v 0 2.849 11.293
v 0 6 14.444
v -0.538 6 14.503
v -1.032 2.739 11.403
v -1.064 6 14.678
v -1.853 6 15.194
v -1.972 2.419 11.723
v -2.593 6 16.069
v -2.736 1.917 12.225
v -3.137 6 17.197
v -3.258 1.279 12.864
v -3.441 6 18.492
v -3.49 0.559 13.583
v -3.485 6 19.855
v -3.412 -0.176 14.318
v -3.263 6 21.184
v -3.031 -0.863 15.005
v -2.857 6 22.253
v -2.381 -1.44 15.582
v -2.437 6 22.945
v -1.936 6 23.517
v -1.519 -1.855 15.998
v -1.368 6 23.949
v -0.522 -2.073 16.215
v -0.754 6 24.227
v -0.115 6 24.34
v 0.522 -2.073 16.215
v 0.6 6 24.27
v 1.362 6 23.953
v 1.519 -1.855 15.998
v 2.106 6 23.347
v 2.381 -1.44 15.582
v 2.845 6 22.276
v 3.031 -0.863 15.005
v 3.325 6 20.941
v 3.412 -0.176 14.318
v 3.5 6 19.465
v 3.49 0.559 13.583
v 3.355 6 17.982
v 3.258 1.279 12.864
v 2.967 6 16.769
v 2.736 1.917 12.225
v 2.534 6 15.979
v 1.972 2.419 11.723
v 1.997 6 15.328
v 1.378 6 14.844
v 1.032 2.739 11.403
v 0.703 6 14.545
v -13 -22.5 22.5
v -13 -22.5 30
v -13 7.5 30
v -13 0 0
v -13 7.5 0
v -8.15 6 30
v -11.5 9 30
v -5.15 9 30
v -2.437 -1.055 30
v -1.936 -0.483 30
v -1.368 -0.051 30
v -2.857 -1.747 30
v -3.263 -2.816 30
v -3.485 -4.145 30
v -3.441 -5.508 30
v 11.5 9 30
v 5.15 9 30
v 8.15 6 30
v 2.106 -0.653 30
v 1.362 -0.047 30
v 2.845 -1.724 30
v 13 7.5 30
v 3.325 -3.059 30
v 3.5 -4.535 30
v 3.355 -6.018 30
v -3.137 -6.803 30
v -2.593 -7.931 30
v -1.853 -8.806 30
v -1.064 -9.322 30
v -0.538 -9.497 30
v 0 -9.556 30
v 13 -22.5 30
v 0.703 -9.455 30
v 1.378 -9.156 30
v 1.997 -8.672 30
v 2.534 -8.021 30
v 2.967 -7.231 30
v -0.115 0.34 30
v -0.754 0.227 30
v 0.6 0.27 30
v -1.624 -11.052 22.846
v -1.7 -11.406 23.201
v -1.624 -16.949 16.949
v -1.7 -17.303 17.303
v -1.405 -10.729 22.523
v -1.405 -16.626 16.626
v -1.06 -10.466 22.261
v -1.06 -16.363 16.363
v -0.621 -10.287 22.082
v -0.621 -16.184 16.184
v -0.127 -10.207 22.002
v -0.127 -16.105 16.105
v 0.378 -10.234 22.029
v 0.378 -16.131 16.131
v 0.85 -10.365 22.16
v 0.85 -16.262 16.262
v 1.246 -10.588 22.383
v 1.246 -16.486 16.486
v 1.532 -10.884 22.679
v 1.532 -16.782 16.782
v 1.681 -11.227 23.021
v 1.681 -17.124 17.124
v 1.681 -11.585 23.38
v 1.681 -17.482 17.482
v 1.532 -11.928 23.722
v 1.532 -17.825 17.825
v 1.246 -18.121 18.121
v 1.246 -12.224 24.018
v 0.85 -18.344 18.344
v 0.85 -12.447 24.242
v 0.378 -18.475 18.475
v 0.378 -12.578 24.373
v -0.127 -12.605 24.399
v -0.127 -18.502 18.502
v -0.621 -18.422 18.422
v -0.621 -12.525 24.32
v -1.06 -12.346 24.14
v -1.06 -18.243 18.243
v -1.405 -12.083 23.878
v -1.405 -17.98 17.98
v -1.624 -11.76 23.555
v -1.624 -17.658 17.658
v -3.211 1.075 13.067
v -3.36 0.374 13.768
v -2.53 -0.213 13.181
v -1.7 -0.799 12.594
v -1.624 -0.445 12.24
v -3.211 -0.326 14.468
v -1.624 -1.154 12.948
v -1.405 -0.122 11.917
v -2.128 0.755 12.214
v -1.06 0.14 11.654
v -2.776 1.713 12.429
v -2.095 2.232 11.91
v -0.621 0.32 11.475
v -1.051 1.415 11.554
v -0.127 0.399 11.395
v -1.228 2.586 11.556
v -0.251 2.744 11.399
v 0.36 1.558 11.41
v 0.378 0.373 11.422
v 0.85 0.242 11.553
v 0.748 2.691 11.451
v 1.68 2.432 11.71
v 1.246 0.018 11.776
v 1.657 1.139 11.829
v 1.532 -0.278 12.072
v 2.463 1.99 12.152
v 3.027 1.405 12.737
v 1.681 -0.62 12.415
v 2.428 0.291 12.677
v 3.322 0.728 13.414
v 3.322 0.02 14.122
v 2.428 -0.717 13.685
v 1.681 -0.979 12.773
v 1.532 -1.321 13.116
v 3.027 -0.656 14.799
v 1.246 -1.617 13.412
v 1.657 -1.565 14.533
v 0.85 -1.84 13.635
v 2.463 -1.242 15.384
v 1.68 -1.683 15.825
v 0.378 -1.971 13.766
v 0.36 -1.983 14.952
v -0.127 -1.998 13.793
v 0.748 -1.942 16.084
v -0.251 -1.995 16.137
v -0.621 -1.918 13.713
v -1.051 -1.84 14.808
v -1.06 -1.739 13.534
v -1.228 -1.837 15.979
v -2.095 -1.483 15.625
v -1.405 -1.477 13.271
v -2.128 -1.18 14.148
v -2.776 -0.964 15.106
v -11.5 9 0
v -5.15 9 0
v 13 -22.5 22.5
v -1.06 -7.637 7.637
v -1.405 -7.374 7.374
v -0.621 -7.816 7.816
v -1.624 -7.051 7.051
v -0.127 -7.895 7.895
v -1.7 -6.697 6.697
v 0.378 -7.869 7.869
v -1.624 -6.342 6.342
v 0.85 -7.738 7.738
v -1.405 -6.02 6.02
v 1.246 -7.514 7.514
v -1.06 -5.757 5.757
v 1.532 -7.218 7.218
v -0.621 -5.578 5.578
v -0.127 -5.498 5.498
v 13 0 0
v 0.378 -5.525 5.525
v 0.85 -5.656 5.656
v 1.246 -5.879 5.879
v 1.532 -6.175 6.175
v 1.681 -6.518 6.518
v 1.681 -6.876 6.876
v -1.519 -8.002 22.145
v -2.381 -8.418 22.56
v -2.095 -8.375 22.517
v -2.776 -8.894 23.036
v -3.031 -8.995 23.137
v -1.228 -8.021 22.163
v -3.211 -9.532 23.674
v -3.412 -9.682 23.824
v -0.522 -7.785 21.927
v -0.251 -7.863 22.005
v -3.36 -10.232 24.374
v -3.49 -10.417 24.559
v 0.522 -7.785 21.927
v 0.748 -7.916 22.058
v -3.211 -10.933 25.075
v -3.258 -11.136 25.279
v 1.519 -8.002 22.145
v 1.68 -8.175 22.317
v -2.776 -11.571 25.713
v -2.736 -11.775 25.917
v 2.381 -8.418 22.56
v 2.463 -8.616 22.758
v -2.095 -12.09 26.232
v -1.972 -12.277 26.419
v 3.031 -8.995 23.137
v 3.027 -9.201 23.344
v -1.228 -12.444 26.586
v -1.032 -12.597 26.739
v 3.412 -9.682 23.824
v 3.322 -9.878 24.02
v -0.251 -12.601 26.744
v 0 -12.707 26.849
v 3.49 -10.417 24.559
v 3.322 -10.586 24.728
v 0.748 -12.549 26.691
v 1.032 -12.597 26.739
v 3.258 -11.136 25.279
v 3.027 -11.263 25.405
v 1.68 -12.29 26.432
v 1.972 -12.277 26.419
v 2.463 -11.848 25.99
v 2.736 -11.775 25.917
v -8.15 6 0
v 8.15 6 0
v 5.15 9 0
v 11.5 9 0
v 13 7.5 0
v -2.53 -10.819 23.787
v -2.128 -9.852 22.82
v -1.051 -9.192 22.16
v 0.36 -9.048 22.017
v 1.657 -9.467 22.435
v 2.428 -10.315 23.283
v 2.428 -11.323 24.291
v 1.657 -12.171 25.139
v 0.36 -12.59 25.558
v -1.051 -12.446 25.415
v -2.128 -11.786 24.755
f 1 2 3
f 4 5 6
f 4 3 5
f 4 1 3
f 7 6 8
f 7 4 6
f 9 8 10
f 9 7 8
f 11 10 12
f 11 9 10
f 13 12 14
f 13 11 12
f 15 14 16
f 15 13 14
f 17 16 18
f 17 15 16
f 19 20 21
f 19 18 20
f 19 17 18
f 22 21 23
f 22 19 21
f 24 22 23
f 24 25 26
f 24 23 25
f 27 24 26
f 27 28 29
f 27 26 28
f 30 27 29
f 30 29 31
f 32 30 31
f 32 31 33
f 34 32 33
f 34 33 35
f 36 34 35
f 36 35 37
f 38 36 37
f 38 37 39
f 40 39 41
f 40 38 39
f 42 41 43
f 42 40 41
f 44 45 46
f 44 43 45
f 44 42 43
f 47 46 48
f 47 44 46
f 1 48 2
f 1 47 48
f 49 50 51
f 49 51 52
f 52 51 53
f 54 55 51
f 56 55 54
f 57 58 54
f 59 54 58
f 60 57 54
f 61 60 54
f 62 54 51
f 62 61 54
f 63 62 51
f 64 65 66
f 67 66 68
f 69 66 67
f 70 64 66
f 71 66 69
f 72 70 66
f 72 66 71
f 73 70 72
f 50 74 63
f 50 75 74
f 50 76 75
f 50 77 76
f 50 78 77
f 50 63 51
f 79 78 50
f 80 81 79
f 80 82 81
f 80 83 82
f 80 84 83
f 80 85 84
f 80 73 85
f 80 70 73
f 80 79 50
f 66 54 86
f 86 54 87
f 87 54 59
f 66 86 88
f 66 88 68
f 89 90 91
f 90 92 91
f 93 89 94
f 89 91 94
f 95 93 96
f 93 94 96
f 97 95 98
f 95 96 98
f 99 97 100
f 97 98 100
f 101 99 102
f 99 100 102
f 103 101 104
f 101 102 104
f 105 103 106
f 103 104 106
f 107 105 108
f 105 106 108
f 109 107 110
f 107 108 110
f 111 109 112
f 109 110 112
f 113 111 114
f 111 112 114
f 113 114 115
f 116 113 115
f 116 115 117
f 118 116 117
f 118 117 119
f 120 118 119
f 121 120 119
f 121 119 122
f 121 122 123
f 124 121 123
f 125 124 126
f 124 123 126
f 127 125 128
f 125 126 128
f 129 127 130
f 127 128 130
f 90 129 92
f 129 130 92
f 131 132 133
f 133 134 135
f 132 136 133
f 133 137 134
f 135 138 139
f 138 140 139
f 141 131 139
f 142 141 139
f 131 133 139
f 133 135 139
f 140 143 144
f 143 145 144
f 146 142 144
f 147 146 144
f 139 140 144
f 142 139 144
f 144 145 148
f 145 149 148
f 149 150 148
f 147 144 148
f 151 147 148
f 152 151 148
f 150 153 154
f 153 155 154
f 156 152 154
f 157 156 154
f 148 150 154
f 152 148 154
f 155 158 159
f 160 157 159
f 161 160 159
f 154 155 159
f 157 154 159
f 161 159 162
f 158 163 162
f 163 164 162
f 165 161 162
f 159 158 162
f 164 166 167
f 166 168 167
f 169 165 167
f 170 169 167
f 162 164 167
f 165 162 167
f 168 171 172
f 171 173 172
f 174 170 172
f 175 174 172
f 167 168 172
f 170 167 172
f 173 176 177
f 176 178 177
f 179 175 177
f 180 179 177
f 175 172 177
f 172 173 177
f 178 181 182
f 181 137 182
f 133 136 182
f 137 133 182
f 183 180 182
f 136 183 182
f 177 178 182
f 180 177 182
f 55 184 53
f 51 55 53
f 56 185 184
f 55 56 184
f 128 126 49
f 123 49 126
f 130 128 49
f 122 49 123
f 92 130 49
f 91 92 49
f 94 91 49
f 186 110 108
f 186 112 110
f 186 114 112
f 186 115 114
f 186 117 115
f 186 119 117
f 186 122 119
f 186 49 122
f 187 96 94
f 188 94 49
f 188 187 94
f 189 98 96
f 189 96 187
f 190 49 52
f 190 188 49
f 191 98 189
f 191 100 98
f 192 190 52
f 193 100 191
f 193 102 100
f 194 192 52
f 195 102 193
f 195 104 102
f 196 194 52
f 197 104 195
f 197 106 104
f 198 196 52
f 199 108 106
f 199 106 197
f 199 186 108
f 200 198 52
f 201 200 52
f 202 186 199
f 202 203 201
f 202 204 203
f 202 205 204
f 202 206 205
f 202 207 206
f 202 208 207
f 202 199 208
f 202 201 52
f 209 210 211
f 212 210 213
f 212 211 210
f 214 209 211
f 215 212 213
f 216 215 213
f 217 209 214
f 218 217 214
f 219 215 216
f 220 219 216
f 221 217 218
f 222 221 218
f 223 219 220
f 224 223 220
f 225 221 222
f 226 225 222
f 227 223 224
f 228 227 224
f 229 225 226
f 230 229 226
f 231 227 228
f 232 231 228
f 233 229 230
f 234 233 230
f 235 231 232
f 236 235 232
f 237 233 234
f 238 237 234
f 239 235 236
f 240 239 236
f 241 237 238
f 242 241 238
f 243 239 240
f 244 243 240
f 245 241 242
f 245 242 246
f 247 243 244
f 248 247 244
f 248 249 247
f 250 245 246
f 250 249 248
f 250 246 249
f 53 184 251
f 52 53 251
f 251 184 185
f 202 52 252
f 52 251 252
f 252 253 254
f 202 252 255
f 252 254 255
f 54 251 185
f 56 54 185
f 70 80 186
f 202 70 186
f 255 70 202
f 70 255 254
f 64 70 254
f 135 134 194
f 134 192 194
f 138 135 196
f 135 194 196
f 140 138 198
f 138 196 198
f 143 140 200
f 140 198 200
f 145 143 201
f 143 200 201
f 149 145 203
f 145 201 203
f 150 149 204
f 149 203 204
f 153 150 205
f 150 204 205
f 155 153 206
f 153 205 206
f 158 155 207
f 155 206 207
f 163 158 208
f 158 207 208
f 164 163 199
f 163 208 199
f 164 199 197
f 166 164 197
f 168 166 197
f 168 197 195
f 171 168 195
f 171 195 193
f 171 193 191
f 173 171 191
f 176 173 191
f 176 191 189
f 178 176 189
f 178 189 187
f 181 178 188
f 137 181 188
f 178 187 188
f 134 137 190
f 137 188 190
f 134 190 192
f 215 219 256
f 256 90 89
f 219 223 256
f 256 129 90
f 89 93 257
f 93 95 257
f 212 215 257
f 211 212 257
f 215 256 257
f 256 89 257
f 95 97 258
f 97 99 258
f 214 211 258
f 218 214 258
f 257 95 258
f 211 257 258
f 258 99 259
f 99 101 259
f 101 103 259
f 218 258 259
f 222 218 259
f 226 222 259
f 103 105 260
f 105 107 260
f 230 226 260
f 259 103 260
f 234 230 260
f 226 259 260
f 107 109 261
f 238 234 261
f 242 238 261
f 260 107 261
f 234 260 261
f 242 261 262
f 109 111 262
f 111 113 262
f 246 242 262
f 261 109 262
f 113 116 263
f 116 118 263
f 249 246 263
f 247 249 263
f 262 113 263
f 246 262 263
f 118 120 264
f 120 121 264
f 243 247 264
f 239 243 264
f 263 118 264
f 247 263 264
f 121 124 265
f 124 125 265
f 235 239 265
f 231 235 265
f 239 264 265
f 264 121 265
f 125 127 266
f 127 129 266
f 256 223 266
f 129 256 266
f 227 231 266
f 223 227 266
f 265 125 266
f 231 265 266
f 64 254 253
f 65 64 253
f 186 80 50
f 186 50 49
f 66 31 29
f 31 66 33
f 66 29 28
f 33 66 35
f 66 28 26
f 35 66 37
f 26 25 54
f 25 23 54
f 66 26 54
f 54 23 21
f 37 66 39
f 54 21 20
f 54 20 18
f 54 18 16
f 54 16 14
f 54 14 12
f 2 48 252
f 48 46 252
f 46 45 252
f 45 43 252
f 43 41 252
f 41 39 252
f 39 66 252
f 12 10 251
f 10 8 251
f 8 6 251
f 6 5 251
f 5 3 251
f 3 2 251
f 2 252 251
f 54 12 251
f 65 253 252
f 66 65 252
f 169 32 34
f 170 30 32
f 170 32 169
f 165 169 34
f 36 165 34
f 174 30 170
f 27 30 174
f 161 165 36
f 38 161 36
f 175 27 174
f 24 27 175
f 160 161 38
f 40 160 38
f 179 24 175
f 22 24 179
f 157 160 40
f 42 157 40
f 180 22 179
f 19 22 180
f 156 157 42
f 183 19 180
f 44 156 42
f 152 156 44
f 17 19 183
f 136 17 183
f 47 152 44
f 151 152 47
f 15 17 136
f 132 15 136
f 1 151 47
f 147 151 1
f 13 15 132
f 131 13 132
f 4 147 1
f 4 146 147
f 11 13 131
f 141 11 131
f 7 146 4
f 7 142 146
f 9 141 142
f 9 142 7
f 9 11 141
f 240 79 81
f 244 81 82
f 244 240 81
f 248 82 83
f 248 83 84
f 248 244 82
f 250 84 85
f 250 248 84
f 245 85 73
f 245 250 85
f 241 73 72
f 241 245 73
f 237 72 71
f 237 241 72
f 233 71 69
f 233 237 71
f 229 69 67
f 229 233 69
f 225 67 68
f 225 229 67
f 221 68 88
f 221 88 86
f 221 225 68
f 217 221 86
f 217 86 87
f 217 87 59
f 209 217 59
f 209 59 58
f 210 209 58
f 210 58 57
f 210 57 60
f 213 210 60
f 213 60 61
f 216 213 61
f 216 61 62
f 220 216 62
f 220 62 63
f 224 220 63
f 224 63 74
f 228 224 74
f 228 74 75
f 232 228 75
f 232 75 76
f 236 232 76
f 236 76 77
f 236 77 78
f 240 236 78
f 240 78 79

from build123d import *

# Parameters (mm, degrees)
BOSS_EXTRUDE1_DEPTH                                  = 30
BOSS_EXTRUDE2_DEPTH                                  = 26
CUT_EXTRUDE1_REACH                                   = 41.613
SKETCH8_R                                            = 3.5
CSK_FOR_M3_HEX_SOCKET_COUNTERSUNK_CAP_SC_D           = 3.4
CSK_FOR_M3_HEX_SOCKET_COUNTERSUNK_CAP_SC_CSINK_D     = 6.72
CSK_FOR_M3_HEX_SOCKET_COUNTERSUNK_CAP_SC_CSINK_ANGLE = 90


with BuildPart() as part:
    # Sketch2 → Boss-Extrude1 (new body)
    with BuildSketch(Plane.XY):
        Polygon((-13, 0), (13, 0), (13, 7.5), (11.5, 9), (5.15, 9), (8.15, 6), (-8.15, 6), (-5.15, 9), (-11.5, 9), (-13, 7.5), align=None)
    extrude(amount=BOSS_EXTRUDE1_DEPTH)

    # Sketch3 → Boss-Extrude2 (add)
    with BuildSketch(Plane(origin=(13, 0, 0), x_dir=(0, 0, -1), z_dir=(1, 0, 0))):
        Polygon((-30, 0), (-30, -22.5), (-22.5, -22.5), (0, 0), align=None)
    extrude(amount=-BOSS_EXTRUDE2_DEPTH)

    # Sketch8 → Cut-Extrude1 (cut, up to next)
    with BuildSketch(Plane(origin=(0, 7.071067812, 7.071067812), x_dir=(1, 0, 0), z_dir=(0, 0.7071067811865462, 0.7071067811865489)), mode=Mode.PRIVATE) as cut_extrude1_sk1:
        with Locations(Location((0, -9.470562748, 0), (0, 0, 90))):
            Circle(SKETCH8_R)
    cut_extrude1_tool1 = extrude(cut_extrude1_sk1.sketch, amount=CUT_EXTRUDE1_REACH, mode=Mode.PRIVATE) & part.part
    # Sketch8 → Cut-Extrude1 (cut, up to next)
    with BuildSketch(Plane(origin=(0, 7.071067812, 7.071067812), x_dir=(1, 0, 0), z_dir=(0, 0.7071067811865462, 0.7071067811865489)), mode=Mode.PRIVATE) as cut_extrude1_sk2:
        with Locations(Location((0, -24.470562748, 0), (0, 0, 270))):
            Circle(SKETCH8_R)
    cut_extrude1_tool2 = extrude(cut_extrude1_sk2.sketch, amount=CUT_EXTRUDE1_REACH, mode=Mode.PRIVATE) & part.part
    add(cut_extrude1_tool1.solids().sort_by_distance((0, 0.374369, 13.767767))[0], mode=Mode.SUBTRACT)
    add(cut_extrude1_tool2.solids().sort_by_distance((0, -10.232233, 24.374369))[0], mode=Mode.SUBTRACT)

    # CSK for M3 Hex Socket Countersunk Cap Screw3 (through all)
    with Locations(Plane(origin=(0, 7.071067812, 7.071067812), x_dir=(1, 0, 0), z_dir=(0, 0.7071067811865462, 0.7071067811865489))):
        with Locations((0, -9.470562748), (0, -24.470562748)):
            CounterSinkHole(CSK_FOR_M3_HEX_SOCKET_COUNTERSUNK_CAP_SC_D / 2, CSK_FOR_M3_HEX_SOCKET_COUNTERSUNK_CAP_SC_CSINK_D / 2, counter_sink_angle=CSK_FOR_M3_HEX_SOCKET_COUNTERSUNK_CAP_SC_CSINK_ANGLE)


solid = part.part
